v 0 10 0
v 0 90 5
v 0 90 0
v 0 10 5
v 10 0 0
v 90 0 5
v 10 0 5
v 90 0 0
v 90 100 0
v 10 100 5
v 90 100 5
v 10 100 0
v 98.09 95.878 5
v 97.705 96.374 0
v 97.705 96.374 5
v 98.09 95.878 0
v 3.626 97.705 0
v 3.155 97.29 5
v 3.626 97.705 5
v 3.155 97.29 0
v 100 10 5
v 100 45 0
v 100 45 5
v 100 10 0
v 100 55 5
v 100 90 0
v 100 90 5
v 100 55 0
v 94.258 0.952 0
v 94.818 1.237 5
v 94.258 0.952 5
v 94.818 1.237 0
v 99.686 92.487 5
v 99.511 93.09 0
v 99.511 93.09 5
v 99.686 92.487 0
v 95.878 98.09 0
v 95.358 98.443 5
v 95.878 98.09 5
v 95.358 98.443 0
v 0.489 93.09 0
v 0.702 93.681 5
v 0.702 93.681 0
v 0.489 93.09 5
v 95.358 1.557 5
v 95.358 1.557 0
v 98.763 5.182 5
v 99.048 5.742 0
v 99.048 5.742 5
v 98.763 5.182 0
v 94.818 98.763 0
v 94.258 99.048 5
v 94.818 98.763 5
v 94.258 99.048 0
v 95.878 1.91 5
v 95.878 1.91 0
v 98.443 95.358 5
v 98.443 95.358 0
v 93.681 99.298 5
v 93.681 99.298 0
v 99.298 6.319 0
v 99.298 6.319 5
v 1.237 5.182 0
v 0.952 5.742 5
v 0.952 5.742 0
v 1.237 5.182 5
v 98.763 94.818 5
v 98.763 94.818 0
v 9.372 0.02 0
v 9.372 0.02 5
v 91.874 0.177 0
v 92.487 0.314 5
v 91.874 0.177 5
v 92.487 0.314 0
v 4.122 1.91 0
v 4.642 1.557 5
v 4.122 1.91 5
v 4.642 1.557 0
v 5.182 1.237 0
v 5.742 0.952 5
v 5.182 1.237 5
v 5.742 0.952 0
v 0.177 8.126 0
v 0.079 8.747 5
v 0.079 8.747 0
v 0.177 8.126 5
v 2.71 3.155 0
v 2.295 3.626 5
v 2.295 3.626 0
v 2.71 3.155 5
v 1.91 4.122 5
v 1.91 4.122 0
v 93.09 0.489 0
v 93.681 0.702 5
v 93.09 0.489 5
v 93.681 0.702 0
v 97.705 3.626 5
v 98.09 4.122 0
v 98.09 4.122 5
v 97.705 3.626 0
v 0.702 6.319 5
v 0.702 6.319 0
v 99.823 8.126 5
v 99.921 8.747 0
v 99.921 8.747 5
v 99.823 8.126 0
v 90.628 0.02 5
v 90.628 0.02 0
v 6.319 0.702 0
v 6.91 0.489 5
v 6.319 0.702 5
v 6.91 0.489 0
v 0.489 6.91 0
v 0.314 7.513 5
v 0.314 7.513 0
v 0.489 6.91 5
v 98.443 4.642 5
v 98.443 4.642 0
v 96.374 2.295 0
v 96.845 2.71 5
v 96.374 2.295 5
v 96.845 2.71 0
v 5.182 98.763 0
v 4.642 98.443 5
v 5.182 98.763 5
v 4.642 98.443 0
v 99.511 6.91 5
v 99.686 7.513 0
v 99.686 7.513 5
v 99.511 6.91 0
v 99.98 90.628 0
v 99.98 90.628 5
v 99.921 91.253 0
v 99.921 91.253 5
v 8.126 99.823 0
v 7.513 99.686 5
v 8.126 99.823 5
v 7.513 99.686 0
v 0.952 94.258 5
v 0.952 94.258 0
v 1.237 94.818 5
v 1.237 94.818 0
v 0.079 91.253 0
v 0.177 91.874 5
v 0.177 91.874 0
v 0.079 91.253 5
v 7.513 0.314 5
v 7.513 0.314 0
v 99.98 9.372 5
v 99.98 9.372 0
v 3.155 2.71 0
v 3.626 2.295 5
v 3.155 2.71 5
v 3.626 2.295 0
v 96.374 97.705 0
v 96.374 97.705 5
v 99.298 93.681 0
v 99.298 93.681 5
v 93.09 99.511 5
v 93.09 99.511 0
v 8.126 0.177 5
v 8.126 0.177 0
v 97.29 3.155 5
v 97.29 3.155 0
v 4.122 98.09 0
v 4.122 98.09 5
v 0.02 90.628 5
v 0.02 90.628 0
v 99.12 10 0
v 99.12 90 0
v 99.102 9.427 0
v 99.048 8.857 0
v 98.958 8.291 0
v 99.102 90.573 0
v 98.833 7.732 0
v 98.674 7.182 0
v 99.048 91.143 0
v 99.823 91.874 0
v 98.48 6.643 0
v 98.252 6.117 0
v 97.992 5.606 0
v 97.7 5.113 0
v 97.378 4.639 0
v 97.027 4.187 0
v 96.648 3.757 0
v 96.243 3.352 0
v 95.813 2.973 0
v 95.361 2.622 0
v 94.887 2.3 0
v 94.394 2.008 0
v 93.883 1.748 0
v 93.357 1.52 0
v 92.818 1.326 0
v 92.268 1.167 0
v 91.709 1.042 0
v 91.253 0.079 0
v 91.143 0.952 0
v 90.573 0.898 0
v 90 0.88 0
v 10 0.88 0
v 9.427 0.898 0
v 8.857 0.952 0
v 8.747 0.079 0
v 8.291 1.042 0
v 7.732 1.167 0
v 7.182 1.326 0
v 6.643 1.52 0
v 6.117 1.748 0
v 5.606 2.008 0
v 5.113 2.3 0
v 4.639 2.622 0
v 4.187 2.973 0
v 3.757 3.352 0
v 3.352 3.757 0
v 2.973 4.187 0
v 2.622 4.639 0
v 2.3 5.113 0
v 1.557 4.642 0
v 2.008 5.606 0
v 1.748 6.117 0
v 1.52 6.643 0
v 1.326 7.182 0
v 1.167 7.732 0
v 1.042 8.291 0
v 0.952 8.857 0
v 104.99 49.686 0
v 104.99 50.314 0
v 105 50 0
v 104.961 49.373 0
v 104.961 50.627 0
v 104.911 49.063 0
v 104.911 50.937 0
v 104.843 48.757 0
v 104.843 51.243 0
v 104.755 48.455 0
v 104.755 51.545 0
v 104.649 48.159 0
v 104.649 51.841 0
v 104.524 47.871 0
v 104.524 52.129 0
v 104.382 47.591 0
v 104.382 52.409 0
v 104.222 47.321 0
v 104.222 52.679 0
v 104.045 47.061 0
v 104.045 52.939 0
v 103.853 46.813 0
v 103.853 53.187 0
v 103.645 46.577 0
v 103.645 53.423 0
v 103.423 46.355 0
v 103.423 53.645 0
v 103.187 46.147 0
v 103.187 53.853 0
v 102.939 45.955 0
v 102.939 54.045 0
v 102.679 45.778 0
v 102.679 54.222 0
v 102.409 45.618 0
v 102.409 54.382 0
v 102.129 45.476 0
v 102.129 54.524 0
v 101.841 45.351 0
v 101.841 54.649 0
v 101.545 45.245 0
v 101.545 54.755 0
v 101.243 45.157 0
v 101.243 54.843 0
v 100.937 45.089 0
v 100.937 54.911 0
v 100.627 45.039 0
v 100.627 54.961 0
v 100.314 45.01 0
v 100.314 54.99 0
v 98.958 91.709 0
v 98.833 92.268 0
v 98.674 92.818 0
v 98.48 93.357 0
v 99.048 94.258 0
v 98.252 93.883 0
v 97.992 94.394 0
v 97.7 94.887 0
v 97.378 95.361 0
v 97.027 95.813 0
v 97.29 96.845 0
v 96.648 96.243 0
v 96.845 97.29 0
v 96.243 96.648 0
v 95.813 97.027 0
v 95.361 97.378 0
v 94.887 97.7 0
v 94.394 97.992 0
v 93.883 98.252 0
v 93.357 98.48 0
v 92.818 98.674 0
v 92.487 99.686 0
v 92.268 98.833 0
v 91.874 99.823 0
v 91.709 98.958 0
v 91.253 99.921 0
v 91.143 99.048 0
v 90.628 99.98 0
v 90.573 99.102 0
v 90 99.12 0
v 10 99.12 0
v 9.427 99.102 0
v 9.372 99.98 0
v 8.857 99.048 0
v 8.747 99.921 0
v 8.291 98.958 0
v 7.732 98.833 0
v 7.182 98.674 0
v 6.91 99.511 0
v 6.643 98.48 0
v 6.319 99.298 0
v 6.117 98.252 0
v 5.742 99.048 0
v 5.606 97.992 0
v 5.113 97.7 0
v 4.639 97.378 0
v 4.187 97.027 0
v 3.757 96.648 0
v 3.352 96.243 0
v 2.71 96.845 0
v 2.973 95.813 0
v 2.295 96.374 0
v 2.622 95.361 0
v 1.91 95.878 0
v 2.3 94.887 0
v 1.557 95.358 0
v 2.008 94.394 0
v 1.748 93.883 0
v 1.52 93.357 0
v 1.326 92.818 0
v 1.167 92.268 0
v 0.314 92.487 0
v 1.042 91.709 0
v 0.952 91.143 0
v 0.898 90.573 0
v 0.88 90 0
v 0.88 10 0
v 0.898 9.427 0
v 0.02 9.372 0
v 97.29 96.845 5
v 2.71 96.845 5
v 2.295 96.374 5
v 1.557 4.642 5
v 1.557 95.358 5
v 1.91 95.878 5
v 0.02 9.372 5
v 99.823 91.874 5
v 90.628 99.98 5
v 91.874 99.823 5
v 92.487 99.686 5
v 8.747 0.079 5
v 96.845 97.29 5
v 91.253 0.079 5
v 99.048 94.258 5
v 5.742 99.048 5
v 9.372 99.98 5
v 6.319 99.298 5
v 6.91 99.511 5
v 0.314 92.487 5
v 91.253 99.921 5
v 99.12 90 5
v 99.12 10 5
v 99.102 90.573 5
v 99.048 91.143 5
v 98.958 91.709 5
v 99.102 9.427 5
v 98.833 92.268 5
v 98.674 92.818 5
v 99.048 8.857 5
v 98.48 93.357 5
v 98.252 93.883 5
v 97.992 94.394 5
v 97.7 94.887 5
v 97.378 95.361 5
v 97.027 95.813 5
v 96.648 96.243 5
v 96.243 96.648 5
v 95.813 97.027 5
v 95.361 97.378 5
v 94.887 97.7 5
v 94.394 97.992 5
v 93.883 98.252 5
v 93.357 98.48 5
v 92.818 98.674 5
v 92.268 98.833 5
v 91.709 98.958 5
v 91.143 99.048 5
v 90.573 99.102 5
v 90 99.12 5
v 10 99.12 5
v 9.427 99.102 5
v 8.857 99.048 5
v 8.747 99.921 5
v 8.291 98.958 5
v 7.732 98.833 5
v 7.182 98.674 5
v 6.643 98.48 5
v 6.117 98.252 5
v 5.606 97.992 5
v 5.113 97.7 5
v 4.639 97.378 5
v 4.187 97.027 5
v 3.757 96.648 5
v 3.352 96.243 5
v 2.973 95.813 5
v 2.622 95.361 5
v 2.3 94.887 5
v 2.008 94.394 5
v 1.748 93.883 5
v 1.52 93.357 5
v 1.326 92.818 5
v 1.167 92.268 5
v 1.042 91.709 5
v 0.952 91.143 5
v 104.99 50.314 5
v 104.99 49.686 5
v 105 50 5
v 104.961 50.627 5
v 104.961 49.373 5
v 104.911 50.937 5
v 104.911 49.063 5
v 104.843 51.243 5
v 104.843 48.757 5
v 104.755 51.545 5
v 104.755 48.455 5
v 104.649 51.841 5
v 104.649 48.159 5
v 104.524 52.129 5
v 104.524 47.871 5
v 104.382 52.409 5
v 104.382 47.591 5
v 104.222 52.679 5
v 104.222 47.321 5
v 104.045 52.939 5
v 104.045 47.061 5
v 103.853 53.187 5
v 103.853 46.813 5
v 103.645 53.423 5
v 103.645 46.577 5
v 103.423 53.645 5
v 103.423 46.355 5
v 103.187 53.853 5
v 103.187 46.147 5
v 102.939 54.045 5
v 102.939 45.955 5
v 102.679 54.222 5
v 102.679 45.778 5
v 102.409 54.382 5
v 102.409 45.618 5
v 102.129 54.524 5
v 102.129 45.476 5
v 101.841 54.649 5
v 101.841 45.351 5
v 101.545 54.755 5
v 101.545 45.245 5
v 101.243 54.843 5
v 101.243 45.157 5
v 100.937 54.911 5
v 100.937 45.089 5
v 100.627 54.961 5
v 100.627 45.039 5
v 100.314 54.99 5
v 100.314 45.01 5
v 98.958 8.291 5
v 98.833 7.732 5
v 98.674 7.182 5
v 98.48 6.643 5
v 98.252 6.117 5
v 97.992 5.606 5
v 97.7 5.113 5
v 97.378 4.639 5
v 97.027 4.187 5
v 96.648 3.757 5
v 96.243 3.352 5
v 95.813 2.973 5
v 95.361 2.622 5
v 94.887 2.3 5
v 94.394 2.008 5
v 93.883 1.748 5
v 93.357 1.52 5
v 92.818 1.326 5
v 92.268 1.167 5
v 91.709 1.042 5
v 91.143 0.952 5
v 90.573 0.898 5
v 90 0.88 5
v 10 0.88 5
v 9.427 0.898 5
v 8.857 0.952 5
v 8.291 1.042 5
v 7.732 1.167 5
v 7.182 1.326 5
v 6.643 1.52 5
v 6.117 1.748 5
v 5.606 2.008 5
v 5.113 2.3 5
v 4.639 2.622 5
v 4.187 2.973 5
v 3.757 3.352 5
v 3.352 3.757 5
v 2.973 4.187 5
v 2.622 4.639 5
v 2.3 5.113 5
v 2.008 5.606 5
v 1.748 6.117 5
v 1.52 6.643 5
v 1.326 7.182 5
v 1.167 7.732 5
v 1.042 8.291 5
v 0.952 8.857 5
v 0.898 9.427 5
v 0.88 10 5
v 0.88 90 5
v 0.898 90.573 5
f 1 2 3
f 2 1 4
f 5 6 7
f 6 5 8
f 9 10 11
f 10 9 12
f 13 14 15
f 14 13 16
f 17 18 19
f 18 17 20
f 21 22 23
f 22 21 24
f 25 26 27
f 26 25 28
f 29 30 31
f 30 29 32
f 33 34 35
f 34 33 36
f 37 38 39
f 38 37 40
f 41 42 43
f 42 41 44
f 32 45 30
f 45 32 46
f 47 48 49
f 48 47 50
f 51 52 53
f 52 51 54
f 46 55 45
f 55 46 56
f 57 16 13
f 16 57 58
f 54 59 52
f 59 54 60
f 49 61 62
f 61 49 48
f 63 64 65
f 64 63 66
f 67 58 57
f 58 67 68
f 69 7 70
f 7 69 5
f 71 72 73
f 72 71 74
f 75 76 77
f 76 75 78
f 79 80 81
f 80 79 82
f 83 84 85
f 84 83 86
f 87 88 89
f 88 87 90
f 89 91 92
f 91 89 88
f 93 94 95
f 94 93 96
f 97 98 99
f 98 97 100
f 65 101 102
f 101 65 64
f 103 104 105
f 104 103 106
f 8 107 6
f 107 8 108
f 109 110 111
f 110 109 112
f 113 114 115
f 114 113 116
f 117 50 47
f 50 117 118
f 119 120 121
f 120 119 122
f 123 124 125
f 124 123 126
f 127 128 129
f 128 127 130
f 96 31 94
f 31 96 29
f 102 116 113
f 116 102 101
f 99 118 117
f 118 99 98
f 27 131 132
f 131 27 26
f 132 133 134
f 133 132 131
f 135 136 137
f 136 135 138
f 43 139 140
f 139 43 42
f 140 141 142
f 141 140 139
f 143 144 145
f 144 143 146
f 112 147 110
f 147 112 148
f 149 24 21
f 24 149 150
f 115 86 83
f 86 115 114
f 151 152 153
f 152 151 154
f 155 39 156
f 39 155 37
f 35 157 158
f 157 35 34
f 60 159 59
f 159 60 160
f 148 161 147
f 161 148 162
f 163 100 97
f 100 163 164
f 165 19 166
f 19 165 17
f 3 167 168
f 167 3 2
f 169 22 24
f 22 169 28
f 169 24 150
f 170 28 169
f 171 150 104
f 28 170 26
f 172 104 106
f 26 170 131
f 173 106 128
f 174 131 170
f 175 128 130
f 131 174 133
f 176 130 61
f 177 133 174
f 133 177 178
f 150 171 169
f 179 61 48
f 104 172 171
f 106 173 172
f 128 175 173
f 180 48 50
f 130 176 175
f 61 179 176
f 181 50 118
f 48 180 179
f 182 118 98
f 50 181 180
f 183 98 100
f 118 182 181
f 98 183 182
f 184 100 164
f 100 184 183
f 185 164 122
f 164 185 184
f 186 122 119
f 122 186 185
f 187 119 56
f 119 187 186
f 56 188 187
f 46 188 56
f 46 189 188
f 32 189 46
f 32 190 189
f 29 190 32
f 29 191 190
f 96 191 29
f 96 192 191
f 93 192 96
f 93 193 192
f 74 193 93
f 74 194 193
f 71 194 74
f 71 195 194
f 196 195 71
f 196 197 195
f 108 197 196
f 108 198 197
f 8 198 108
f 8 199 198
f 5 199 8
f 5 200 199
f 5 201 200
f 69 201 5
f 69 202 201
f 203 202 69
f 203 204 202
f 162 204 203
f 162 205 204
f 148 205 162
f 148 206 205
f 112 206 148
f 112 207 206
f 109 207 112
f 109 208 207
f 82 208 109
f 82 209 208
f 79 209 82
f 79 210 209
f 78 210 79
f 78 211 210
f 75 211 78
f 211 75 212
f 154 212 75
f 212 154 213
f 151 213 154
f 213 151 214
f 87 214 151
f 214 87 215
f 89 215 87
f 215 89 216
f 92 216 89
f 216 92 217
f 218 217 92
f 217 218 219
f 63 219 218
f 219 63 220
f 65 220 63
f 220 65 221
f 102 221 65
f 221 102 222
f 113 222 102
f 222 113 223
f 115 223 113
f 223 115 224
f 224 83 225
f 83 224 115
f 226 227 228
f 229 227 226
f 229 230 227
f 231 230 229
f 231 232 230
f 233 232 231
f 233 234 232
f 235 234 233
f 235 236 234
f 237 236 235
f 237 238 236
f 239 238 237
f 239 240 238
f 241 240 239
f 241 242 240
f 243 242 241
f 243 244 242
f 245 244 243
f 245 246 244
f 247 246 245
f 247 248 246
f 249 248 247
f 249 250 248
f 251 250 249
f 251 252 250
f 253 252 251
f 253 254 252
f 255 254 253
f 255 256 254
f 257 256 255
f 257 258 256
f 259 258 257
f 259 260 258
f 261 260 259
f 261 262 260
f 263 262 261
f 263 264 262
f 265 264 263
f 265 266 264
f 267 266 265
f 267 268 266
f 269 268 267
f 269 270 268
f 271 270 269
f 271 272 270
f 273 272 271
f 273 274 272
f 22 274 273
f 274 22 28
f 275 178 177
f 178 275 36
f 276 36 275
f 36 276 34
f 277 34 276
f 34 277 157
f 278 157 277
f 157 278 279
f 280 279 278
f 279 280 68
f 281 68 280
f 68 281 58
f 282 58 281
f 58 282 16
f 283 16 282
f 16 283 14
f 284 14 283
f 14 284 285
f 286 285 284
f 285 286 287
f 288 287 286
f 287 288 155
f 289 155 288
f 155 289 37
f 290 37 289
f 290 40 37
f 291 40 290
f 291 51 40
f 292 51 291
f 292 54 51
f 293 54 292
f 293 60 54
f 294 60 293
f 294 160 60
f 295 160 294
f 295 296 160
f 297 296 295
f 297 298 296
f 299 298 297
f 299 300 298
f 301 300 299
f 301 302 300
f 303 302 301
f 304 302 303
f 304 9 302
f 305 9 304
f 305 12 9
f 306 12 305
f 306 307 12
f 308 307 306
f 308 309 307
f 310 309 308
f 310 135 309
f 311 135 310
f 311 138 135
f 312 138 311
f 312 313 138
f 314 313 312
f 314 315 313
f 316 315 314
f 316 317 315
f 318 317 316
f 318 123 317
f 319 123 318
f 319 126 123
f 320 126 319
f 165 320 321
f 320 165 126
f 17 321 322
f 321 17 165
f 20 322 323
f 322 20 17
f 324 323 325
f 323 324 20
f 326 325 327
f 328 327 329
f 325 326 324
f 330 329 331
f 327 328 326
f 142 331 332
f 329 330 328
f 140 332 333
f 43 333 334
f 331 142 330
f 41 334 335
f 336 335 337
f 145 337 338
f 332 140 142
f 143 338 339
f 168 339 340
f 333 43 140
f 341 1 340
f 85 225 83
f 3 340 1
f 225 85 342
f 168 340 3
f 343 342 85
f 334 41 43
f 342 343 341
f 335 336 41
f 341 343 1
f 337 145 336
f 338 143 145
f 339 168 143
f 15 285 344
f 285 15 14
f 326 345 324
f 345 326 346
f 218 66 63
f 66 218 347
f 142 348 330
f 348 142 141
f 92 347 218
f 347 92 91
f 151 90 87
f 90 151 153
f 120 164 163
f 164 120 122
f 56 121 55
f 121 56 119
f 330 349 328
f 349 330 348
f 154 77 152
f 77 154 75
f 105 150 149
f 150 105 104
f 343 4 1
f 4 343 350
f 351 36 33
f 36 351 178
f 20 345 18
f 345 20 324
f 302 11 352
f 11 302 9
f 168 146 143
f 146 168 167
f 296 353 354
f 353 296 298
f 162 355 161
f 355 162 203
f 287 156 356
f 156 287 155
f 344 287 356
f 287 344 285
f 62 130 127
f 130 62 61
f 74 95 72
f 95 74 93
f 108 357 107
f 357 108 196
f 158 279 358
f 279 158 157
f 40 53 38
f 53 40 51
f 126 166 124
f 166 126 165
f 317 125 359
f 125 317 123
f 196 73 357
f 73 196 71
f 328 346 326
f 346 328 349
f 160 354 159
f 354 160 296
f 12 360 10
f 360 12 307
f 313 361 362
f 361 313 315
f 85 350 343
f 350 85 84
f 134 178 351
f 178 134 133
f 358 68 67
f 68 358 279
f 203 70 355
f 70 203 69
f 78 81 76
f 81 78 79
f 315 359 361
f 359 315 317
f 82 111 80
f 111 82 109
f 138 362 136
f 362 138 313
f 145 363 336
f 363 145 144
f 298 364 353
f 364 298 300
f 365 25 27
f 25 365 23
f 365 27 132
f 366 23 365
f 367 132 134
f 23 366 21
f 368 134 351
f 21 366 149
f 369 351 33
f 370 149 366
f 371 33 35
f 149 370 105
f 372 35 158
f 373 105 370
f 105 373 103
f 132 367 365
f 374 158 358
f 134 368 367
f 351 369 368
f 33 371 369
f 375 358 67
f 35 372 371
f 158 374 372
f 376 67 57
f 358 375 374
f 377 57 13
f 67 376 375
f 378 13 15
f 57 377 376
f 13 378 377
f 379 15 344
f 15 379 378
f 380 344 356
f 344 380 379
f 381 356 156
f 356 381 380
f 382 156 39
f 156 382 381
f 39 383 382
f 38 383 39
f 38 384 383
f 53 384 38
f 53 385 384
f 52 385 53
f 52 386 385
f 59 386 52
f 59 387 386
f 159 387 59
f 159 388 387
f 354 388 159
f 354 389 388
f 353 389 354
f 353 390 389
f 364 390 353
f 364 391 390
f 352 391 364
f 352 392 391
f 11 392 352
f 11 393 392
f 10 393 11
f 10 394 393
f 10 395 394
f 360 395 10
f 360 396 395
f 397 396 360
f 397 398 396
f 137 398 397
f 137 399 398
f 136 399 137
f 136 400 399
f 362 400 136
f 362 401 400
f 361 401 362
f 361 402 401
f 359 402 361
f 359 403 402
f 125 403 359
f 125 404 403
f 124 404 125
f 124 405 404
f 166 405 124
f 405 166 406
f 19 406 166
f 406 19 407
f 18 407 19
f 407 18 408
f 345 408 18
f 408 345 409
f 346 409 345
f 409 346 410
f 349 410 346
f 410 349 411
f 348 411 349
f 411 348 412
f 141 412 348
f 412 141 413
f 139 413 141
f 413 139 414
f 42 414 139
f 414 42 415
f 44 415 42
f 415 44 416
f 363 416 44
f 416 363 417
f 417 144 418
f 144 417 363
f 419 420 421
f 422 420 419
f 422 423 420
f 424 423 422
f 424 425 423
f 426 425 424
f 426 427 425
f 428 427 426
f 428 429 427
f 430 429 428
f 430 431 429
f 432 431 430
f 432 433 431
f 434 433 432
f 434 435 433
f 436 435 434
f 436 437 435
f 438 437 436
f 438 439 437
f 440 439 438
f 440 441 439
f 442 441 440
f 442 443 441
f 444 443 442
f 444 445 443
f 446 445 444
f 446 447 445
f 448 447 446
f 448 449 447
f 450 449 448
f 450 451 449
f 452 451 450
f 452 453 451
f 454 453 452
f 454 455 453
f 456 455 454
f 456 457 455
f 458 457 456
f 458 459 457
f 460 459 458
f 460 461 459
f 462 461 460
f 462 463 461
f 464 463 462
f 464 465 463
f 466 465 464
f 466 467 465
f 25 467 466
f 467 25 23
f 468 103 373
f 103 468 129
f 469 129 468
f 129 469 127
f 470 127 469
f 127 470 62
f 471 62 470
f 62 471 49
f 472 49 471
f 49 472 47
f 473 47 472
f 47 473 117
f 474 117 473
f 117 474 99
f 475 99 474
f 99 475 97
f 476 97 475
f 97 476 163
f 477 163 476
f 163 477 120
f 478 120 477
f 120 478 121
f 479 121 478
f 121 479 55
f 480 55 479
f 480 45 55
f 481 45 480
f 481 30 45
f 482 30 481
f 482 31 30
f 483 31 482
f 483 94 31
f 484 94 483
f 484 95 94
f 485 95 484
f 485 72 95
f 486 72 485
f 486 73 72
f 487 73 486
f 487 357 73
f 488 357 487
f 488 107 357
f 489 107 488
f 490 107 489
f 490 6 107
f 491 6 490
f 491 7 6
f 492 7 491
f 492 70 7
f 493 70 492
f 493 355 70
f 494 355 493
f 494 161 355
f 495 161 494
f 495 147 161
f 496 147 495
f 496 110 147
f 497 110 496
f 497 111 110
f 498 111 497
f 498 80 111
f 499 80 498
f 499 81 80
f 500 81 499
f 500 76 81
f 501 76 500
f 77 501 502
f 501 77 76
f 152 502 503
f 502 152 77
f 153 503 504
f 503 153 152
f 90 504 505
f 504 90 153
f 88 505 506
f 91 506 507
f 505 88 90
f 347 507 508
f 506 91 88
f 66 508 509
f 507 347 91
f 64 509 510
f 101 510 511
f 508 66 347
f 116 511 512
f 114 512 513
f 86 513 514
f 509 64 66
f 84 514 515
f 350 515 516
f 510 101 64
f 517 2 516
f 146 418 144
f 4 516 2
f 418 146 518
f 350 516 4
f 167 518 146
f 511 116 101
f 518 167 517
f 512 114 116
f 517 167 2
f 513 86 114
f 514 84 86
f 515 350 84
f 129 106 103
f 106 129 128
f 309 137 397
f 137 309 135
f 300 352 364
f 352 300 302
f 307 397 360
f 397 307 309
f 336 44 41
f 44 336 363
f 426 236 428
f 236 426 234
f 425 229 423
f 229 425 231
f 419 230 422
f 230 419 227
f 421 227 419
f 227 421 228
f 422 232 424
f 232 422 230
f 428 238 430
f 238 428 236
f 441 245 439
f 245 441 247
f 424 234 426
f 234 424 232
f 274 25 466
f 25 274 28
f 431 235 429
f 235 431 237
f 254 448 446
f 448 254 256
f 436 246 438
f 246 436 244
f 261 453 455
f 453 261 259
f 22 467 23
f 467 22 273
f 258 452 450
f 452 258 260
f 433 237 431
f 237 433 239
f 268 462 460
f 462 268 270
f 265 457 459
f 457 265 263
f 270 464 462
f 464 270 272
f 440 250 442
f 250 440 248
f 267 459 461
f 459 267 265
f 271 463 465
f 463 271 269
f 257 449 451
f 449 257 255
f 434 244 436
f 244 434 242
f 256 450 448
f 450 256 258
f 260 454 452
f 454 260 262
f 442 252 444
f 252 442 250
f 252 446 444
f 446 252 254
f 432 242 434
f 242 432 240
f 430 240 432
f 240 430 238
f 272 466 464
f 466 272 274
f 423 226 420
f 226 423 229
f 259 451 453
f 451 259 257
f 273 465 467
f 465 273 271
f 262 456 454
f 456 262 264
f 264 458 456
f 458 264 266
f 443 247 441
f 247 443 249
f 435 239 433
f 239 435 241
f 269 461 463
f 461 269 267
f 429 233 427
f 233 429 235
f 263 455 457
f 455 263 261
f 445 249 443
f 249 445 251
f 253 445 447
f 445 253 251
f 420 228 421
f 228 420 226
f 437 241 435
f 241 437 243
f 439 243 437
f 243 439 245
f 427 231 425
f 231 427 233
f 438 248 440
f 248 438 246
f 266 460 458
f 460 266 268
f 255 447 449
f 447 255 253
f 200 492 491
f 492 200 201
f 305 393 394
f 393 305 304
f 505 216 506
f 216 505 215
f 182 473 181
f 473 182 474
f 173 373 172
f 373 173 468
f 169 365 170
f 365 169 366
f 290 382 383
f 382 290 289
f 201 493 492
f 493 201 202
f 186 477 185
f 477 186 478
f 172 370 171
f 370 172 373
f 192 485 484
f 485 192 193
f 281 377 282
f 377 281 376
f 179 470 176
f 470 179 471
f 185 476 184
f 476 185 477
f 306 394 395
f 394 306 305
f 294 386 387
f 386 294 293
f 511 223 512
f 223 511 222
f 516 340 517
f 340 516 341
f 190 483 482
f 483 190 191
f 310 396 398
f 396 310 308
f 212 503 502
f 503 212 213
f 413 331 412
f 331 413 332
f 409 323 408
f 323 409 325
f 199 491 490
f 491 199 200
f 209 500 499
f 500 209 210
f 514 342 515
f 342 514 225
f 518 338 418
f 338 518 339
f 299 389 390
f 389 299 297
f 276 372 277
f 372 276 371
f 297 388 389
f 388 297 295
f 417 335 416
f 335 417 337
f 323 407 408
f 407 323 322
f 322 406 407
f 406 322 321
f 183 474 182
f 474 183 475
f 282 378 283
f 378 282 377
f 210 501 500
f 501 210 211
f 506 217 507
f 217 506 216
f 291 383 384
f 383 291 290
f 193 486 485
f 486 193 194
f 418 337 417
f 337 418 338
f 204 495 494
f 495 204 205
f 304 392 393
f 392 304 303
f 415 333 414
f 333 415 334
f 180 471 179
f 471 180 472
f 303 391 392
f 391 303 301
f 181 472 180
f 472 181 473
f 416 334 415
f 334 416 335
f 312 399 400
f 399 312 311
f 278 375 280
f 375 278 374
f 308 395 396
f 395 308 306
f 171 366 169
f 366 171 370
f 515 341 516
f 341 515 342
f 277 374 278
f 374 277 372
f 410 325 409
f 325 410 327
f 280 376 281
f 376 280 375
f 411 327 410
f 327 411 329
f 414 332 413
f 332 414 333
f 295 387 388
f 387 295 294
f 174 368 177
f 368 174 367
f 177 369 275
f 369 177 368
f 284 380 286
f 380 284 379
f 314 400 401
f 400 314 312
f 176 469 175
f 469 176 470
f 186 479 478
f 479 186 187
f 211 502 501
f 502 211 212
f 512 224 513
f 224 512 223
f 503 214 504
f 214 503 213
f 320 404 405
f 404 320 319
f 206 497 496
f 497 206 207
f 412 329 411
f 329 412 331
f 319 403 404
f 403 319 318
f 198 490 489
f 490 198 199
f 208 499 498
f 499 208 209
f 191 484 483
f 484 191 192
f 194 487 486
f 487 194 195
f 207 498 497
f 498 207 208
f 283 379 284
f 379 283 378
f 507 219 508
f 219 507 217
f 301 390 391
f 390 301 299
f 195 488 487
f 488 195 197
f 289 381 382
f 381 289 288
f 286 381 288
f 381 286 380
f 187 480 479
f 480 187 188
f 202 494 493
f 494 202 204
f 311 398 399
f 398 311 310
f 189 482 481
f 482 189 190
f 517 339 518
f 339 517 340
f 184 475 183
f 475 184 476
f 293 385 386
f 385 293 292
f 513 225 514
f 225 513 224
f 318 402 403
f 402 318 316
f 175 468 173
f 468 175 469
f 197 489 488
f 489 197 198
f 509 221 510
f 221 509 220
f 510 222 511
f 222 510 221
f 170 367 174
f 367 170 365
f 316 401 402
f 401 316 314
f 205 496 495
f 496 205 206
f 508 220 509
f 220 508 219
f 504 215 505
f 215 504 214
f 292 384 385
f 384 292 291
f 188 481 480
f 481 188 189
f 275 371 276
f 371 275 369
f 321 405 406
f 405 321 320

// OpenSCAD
$fn=100;

s=100;
h=5;
t=0.44 *2;
si=s-2*t;
r=10;
rc=5;

difference(){
    union(){
        rcube(s,s,h,r);
        
        // Right
        translate([s, s/2, 0]){
            cylinder(r=rc, h=h);
            
            translate([-rc-t, -rc, 0])
            cube([rc+t, 6*t, h]);
        }
    }
    
    translate([t,t,-.1])
    rcube(si,si,h+1,r-t);
}

module rcube(length,width,height,radius=.05,chamfer=0){    
    l=length-2*radius;
    w=width-2*radius;
    difference(){
        translate([radius,radius,0])
        hull(){
            cylinder(r=radius,h=height);    
            translate([0,w,0])
            cylinder(r=radius,h=height);    
            translate([l,0,0])
            cylinder(r=radius,h=height);    
            translate([l,w,0])
            cylinder(r=radius,h=height);    
        }
        /*******************************/
        difference(){
            translate([-.1,-.1,-.1])
                cube([length+.2,width+.2,chamfer]);
            /*******************************/
            hull(){
                translate([-.1,-.1,chamfer])
                cube([length+.2,width+.2,.1]);
                translate([chamfer,chamfer-.1])
                cube([length-chamfer*2,width-chamfer*2,.1]);
            }
        }
    }
}
